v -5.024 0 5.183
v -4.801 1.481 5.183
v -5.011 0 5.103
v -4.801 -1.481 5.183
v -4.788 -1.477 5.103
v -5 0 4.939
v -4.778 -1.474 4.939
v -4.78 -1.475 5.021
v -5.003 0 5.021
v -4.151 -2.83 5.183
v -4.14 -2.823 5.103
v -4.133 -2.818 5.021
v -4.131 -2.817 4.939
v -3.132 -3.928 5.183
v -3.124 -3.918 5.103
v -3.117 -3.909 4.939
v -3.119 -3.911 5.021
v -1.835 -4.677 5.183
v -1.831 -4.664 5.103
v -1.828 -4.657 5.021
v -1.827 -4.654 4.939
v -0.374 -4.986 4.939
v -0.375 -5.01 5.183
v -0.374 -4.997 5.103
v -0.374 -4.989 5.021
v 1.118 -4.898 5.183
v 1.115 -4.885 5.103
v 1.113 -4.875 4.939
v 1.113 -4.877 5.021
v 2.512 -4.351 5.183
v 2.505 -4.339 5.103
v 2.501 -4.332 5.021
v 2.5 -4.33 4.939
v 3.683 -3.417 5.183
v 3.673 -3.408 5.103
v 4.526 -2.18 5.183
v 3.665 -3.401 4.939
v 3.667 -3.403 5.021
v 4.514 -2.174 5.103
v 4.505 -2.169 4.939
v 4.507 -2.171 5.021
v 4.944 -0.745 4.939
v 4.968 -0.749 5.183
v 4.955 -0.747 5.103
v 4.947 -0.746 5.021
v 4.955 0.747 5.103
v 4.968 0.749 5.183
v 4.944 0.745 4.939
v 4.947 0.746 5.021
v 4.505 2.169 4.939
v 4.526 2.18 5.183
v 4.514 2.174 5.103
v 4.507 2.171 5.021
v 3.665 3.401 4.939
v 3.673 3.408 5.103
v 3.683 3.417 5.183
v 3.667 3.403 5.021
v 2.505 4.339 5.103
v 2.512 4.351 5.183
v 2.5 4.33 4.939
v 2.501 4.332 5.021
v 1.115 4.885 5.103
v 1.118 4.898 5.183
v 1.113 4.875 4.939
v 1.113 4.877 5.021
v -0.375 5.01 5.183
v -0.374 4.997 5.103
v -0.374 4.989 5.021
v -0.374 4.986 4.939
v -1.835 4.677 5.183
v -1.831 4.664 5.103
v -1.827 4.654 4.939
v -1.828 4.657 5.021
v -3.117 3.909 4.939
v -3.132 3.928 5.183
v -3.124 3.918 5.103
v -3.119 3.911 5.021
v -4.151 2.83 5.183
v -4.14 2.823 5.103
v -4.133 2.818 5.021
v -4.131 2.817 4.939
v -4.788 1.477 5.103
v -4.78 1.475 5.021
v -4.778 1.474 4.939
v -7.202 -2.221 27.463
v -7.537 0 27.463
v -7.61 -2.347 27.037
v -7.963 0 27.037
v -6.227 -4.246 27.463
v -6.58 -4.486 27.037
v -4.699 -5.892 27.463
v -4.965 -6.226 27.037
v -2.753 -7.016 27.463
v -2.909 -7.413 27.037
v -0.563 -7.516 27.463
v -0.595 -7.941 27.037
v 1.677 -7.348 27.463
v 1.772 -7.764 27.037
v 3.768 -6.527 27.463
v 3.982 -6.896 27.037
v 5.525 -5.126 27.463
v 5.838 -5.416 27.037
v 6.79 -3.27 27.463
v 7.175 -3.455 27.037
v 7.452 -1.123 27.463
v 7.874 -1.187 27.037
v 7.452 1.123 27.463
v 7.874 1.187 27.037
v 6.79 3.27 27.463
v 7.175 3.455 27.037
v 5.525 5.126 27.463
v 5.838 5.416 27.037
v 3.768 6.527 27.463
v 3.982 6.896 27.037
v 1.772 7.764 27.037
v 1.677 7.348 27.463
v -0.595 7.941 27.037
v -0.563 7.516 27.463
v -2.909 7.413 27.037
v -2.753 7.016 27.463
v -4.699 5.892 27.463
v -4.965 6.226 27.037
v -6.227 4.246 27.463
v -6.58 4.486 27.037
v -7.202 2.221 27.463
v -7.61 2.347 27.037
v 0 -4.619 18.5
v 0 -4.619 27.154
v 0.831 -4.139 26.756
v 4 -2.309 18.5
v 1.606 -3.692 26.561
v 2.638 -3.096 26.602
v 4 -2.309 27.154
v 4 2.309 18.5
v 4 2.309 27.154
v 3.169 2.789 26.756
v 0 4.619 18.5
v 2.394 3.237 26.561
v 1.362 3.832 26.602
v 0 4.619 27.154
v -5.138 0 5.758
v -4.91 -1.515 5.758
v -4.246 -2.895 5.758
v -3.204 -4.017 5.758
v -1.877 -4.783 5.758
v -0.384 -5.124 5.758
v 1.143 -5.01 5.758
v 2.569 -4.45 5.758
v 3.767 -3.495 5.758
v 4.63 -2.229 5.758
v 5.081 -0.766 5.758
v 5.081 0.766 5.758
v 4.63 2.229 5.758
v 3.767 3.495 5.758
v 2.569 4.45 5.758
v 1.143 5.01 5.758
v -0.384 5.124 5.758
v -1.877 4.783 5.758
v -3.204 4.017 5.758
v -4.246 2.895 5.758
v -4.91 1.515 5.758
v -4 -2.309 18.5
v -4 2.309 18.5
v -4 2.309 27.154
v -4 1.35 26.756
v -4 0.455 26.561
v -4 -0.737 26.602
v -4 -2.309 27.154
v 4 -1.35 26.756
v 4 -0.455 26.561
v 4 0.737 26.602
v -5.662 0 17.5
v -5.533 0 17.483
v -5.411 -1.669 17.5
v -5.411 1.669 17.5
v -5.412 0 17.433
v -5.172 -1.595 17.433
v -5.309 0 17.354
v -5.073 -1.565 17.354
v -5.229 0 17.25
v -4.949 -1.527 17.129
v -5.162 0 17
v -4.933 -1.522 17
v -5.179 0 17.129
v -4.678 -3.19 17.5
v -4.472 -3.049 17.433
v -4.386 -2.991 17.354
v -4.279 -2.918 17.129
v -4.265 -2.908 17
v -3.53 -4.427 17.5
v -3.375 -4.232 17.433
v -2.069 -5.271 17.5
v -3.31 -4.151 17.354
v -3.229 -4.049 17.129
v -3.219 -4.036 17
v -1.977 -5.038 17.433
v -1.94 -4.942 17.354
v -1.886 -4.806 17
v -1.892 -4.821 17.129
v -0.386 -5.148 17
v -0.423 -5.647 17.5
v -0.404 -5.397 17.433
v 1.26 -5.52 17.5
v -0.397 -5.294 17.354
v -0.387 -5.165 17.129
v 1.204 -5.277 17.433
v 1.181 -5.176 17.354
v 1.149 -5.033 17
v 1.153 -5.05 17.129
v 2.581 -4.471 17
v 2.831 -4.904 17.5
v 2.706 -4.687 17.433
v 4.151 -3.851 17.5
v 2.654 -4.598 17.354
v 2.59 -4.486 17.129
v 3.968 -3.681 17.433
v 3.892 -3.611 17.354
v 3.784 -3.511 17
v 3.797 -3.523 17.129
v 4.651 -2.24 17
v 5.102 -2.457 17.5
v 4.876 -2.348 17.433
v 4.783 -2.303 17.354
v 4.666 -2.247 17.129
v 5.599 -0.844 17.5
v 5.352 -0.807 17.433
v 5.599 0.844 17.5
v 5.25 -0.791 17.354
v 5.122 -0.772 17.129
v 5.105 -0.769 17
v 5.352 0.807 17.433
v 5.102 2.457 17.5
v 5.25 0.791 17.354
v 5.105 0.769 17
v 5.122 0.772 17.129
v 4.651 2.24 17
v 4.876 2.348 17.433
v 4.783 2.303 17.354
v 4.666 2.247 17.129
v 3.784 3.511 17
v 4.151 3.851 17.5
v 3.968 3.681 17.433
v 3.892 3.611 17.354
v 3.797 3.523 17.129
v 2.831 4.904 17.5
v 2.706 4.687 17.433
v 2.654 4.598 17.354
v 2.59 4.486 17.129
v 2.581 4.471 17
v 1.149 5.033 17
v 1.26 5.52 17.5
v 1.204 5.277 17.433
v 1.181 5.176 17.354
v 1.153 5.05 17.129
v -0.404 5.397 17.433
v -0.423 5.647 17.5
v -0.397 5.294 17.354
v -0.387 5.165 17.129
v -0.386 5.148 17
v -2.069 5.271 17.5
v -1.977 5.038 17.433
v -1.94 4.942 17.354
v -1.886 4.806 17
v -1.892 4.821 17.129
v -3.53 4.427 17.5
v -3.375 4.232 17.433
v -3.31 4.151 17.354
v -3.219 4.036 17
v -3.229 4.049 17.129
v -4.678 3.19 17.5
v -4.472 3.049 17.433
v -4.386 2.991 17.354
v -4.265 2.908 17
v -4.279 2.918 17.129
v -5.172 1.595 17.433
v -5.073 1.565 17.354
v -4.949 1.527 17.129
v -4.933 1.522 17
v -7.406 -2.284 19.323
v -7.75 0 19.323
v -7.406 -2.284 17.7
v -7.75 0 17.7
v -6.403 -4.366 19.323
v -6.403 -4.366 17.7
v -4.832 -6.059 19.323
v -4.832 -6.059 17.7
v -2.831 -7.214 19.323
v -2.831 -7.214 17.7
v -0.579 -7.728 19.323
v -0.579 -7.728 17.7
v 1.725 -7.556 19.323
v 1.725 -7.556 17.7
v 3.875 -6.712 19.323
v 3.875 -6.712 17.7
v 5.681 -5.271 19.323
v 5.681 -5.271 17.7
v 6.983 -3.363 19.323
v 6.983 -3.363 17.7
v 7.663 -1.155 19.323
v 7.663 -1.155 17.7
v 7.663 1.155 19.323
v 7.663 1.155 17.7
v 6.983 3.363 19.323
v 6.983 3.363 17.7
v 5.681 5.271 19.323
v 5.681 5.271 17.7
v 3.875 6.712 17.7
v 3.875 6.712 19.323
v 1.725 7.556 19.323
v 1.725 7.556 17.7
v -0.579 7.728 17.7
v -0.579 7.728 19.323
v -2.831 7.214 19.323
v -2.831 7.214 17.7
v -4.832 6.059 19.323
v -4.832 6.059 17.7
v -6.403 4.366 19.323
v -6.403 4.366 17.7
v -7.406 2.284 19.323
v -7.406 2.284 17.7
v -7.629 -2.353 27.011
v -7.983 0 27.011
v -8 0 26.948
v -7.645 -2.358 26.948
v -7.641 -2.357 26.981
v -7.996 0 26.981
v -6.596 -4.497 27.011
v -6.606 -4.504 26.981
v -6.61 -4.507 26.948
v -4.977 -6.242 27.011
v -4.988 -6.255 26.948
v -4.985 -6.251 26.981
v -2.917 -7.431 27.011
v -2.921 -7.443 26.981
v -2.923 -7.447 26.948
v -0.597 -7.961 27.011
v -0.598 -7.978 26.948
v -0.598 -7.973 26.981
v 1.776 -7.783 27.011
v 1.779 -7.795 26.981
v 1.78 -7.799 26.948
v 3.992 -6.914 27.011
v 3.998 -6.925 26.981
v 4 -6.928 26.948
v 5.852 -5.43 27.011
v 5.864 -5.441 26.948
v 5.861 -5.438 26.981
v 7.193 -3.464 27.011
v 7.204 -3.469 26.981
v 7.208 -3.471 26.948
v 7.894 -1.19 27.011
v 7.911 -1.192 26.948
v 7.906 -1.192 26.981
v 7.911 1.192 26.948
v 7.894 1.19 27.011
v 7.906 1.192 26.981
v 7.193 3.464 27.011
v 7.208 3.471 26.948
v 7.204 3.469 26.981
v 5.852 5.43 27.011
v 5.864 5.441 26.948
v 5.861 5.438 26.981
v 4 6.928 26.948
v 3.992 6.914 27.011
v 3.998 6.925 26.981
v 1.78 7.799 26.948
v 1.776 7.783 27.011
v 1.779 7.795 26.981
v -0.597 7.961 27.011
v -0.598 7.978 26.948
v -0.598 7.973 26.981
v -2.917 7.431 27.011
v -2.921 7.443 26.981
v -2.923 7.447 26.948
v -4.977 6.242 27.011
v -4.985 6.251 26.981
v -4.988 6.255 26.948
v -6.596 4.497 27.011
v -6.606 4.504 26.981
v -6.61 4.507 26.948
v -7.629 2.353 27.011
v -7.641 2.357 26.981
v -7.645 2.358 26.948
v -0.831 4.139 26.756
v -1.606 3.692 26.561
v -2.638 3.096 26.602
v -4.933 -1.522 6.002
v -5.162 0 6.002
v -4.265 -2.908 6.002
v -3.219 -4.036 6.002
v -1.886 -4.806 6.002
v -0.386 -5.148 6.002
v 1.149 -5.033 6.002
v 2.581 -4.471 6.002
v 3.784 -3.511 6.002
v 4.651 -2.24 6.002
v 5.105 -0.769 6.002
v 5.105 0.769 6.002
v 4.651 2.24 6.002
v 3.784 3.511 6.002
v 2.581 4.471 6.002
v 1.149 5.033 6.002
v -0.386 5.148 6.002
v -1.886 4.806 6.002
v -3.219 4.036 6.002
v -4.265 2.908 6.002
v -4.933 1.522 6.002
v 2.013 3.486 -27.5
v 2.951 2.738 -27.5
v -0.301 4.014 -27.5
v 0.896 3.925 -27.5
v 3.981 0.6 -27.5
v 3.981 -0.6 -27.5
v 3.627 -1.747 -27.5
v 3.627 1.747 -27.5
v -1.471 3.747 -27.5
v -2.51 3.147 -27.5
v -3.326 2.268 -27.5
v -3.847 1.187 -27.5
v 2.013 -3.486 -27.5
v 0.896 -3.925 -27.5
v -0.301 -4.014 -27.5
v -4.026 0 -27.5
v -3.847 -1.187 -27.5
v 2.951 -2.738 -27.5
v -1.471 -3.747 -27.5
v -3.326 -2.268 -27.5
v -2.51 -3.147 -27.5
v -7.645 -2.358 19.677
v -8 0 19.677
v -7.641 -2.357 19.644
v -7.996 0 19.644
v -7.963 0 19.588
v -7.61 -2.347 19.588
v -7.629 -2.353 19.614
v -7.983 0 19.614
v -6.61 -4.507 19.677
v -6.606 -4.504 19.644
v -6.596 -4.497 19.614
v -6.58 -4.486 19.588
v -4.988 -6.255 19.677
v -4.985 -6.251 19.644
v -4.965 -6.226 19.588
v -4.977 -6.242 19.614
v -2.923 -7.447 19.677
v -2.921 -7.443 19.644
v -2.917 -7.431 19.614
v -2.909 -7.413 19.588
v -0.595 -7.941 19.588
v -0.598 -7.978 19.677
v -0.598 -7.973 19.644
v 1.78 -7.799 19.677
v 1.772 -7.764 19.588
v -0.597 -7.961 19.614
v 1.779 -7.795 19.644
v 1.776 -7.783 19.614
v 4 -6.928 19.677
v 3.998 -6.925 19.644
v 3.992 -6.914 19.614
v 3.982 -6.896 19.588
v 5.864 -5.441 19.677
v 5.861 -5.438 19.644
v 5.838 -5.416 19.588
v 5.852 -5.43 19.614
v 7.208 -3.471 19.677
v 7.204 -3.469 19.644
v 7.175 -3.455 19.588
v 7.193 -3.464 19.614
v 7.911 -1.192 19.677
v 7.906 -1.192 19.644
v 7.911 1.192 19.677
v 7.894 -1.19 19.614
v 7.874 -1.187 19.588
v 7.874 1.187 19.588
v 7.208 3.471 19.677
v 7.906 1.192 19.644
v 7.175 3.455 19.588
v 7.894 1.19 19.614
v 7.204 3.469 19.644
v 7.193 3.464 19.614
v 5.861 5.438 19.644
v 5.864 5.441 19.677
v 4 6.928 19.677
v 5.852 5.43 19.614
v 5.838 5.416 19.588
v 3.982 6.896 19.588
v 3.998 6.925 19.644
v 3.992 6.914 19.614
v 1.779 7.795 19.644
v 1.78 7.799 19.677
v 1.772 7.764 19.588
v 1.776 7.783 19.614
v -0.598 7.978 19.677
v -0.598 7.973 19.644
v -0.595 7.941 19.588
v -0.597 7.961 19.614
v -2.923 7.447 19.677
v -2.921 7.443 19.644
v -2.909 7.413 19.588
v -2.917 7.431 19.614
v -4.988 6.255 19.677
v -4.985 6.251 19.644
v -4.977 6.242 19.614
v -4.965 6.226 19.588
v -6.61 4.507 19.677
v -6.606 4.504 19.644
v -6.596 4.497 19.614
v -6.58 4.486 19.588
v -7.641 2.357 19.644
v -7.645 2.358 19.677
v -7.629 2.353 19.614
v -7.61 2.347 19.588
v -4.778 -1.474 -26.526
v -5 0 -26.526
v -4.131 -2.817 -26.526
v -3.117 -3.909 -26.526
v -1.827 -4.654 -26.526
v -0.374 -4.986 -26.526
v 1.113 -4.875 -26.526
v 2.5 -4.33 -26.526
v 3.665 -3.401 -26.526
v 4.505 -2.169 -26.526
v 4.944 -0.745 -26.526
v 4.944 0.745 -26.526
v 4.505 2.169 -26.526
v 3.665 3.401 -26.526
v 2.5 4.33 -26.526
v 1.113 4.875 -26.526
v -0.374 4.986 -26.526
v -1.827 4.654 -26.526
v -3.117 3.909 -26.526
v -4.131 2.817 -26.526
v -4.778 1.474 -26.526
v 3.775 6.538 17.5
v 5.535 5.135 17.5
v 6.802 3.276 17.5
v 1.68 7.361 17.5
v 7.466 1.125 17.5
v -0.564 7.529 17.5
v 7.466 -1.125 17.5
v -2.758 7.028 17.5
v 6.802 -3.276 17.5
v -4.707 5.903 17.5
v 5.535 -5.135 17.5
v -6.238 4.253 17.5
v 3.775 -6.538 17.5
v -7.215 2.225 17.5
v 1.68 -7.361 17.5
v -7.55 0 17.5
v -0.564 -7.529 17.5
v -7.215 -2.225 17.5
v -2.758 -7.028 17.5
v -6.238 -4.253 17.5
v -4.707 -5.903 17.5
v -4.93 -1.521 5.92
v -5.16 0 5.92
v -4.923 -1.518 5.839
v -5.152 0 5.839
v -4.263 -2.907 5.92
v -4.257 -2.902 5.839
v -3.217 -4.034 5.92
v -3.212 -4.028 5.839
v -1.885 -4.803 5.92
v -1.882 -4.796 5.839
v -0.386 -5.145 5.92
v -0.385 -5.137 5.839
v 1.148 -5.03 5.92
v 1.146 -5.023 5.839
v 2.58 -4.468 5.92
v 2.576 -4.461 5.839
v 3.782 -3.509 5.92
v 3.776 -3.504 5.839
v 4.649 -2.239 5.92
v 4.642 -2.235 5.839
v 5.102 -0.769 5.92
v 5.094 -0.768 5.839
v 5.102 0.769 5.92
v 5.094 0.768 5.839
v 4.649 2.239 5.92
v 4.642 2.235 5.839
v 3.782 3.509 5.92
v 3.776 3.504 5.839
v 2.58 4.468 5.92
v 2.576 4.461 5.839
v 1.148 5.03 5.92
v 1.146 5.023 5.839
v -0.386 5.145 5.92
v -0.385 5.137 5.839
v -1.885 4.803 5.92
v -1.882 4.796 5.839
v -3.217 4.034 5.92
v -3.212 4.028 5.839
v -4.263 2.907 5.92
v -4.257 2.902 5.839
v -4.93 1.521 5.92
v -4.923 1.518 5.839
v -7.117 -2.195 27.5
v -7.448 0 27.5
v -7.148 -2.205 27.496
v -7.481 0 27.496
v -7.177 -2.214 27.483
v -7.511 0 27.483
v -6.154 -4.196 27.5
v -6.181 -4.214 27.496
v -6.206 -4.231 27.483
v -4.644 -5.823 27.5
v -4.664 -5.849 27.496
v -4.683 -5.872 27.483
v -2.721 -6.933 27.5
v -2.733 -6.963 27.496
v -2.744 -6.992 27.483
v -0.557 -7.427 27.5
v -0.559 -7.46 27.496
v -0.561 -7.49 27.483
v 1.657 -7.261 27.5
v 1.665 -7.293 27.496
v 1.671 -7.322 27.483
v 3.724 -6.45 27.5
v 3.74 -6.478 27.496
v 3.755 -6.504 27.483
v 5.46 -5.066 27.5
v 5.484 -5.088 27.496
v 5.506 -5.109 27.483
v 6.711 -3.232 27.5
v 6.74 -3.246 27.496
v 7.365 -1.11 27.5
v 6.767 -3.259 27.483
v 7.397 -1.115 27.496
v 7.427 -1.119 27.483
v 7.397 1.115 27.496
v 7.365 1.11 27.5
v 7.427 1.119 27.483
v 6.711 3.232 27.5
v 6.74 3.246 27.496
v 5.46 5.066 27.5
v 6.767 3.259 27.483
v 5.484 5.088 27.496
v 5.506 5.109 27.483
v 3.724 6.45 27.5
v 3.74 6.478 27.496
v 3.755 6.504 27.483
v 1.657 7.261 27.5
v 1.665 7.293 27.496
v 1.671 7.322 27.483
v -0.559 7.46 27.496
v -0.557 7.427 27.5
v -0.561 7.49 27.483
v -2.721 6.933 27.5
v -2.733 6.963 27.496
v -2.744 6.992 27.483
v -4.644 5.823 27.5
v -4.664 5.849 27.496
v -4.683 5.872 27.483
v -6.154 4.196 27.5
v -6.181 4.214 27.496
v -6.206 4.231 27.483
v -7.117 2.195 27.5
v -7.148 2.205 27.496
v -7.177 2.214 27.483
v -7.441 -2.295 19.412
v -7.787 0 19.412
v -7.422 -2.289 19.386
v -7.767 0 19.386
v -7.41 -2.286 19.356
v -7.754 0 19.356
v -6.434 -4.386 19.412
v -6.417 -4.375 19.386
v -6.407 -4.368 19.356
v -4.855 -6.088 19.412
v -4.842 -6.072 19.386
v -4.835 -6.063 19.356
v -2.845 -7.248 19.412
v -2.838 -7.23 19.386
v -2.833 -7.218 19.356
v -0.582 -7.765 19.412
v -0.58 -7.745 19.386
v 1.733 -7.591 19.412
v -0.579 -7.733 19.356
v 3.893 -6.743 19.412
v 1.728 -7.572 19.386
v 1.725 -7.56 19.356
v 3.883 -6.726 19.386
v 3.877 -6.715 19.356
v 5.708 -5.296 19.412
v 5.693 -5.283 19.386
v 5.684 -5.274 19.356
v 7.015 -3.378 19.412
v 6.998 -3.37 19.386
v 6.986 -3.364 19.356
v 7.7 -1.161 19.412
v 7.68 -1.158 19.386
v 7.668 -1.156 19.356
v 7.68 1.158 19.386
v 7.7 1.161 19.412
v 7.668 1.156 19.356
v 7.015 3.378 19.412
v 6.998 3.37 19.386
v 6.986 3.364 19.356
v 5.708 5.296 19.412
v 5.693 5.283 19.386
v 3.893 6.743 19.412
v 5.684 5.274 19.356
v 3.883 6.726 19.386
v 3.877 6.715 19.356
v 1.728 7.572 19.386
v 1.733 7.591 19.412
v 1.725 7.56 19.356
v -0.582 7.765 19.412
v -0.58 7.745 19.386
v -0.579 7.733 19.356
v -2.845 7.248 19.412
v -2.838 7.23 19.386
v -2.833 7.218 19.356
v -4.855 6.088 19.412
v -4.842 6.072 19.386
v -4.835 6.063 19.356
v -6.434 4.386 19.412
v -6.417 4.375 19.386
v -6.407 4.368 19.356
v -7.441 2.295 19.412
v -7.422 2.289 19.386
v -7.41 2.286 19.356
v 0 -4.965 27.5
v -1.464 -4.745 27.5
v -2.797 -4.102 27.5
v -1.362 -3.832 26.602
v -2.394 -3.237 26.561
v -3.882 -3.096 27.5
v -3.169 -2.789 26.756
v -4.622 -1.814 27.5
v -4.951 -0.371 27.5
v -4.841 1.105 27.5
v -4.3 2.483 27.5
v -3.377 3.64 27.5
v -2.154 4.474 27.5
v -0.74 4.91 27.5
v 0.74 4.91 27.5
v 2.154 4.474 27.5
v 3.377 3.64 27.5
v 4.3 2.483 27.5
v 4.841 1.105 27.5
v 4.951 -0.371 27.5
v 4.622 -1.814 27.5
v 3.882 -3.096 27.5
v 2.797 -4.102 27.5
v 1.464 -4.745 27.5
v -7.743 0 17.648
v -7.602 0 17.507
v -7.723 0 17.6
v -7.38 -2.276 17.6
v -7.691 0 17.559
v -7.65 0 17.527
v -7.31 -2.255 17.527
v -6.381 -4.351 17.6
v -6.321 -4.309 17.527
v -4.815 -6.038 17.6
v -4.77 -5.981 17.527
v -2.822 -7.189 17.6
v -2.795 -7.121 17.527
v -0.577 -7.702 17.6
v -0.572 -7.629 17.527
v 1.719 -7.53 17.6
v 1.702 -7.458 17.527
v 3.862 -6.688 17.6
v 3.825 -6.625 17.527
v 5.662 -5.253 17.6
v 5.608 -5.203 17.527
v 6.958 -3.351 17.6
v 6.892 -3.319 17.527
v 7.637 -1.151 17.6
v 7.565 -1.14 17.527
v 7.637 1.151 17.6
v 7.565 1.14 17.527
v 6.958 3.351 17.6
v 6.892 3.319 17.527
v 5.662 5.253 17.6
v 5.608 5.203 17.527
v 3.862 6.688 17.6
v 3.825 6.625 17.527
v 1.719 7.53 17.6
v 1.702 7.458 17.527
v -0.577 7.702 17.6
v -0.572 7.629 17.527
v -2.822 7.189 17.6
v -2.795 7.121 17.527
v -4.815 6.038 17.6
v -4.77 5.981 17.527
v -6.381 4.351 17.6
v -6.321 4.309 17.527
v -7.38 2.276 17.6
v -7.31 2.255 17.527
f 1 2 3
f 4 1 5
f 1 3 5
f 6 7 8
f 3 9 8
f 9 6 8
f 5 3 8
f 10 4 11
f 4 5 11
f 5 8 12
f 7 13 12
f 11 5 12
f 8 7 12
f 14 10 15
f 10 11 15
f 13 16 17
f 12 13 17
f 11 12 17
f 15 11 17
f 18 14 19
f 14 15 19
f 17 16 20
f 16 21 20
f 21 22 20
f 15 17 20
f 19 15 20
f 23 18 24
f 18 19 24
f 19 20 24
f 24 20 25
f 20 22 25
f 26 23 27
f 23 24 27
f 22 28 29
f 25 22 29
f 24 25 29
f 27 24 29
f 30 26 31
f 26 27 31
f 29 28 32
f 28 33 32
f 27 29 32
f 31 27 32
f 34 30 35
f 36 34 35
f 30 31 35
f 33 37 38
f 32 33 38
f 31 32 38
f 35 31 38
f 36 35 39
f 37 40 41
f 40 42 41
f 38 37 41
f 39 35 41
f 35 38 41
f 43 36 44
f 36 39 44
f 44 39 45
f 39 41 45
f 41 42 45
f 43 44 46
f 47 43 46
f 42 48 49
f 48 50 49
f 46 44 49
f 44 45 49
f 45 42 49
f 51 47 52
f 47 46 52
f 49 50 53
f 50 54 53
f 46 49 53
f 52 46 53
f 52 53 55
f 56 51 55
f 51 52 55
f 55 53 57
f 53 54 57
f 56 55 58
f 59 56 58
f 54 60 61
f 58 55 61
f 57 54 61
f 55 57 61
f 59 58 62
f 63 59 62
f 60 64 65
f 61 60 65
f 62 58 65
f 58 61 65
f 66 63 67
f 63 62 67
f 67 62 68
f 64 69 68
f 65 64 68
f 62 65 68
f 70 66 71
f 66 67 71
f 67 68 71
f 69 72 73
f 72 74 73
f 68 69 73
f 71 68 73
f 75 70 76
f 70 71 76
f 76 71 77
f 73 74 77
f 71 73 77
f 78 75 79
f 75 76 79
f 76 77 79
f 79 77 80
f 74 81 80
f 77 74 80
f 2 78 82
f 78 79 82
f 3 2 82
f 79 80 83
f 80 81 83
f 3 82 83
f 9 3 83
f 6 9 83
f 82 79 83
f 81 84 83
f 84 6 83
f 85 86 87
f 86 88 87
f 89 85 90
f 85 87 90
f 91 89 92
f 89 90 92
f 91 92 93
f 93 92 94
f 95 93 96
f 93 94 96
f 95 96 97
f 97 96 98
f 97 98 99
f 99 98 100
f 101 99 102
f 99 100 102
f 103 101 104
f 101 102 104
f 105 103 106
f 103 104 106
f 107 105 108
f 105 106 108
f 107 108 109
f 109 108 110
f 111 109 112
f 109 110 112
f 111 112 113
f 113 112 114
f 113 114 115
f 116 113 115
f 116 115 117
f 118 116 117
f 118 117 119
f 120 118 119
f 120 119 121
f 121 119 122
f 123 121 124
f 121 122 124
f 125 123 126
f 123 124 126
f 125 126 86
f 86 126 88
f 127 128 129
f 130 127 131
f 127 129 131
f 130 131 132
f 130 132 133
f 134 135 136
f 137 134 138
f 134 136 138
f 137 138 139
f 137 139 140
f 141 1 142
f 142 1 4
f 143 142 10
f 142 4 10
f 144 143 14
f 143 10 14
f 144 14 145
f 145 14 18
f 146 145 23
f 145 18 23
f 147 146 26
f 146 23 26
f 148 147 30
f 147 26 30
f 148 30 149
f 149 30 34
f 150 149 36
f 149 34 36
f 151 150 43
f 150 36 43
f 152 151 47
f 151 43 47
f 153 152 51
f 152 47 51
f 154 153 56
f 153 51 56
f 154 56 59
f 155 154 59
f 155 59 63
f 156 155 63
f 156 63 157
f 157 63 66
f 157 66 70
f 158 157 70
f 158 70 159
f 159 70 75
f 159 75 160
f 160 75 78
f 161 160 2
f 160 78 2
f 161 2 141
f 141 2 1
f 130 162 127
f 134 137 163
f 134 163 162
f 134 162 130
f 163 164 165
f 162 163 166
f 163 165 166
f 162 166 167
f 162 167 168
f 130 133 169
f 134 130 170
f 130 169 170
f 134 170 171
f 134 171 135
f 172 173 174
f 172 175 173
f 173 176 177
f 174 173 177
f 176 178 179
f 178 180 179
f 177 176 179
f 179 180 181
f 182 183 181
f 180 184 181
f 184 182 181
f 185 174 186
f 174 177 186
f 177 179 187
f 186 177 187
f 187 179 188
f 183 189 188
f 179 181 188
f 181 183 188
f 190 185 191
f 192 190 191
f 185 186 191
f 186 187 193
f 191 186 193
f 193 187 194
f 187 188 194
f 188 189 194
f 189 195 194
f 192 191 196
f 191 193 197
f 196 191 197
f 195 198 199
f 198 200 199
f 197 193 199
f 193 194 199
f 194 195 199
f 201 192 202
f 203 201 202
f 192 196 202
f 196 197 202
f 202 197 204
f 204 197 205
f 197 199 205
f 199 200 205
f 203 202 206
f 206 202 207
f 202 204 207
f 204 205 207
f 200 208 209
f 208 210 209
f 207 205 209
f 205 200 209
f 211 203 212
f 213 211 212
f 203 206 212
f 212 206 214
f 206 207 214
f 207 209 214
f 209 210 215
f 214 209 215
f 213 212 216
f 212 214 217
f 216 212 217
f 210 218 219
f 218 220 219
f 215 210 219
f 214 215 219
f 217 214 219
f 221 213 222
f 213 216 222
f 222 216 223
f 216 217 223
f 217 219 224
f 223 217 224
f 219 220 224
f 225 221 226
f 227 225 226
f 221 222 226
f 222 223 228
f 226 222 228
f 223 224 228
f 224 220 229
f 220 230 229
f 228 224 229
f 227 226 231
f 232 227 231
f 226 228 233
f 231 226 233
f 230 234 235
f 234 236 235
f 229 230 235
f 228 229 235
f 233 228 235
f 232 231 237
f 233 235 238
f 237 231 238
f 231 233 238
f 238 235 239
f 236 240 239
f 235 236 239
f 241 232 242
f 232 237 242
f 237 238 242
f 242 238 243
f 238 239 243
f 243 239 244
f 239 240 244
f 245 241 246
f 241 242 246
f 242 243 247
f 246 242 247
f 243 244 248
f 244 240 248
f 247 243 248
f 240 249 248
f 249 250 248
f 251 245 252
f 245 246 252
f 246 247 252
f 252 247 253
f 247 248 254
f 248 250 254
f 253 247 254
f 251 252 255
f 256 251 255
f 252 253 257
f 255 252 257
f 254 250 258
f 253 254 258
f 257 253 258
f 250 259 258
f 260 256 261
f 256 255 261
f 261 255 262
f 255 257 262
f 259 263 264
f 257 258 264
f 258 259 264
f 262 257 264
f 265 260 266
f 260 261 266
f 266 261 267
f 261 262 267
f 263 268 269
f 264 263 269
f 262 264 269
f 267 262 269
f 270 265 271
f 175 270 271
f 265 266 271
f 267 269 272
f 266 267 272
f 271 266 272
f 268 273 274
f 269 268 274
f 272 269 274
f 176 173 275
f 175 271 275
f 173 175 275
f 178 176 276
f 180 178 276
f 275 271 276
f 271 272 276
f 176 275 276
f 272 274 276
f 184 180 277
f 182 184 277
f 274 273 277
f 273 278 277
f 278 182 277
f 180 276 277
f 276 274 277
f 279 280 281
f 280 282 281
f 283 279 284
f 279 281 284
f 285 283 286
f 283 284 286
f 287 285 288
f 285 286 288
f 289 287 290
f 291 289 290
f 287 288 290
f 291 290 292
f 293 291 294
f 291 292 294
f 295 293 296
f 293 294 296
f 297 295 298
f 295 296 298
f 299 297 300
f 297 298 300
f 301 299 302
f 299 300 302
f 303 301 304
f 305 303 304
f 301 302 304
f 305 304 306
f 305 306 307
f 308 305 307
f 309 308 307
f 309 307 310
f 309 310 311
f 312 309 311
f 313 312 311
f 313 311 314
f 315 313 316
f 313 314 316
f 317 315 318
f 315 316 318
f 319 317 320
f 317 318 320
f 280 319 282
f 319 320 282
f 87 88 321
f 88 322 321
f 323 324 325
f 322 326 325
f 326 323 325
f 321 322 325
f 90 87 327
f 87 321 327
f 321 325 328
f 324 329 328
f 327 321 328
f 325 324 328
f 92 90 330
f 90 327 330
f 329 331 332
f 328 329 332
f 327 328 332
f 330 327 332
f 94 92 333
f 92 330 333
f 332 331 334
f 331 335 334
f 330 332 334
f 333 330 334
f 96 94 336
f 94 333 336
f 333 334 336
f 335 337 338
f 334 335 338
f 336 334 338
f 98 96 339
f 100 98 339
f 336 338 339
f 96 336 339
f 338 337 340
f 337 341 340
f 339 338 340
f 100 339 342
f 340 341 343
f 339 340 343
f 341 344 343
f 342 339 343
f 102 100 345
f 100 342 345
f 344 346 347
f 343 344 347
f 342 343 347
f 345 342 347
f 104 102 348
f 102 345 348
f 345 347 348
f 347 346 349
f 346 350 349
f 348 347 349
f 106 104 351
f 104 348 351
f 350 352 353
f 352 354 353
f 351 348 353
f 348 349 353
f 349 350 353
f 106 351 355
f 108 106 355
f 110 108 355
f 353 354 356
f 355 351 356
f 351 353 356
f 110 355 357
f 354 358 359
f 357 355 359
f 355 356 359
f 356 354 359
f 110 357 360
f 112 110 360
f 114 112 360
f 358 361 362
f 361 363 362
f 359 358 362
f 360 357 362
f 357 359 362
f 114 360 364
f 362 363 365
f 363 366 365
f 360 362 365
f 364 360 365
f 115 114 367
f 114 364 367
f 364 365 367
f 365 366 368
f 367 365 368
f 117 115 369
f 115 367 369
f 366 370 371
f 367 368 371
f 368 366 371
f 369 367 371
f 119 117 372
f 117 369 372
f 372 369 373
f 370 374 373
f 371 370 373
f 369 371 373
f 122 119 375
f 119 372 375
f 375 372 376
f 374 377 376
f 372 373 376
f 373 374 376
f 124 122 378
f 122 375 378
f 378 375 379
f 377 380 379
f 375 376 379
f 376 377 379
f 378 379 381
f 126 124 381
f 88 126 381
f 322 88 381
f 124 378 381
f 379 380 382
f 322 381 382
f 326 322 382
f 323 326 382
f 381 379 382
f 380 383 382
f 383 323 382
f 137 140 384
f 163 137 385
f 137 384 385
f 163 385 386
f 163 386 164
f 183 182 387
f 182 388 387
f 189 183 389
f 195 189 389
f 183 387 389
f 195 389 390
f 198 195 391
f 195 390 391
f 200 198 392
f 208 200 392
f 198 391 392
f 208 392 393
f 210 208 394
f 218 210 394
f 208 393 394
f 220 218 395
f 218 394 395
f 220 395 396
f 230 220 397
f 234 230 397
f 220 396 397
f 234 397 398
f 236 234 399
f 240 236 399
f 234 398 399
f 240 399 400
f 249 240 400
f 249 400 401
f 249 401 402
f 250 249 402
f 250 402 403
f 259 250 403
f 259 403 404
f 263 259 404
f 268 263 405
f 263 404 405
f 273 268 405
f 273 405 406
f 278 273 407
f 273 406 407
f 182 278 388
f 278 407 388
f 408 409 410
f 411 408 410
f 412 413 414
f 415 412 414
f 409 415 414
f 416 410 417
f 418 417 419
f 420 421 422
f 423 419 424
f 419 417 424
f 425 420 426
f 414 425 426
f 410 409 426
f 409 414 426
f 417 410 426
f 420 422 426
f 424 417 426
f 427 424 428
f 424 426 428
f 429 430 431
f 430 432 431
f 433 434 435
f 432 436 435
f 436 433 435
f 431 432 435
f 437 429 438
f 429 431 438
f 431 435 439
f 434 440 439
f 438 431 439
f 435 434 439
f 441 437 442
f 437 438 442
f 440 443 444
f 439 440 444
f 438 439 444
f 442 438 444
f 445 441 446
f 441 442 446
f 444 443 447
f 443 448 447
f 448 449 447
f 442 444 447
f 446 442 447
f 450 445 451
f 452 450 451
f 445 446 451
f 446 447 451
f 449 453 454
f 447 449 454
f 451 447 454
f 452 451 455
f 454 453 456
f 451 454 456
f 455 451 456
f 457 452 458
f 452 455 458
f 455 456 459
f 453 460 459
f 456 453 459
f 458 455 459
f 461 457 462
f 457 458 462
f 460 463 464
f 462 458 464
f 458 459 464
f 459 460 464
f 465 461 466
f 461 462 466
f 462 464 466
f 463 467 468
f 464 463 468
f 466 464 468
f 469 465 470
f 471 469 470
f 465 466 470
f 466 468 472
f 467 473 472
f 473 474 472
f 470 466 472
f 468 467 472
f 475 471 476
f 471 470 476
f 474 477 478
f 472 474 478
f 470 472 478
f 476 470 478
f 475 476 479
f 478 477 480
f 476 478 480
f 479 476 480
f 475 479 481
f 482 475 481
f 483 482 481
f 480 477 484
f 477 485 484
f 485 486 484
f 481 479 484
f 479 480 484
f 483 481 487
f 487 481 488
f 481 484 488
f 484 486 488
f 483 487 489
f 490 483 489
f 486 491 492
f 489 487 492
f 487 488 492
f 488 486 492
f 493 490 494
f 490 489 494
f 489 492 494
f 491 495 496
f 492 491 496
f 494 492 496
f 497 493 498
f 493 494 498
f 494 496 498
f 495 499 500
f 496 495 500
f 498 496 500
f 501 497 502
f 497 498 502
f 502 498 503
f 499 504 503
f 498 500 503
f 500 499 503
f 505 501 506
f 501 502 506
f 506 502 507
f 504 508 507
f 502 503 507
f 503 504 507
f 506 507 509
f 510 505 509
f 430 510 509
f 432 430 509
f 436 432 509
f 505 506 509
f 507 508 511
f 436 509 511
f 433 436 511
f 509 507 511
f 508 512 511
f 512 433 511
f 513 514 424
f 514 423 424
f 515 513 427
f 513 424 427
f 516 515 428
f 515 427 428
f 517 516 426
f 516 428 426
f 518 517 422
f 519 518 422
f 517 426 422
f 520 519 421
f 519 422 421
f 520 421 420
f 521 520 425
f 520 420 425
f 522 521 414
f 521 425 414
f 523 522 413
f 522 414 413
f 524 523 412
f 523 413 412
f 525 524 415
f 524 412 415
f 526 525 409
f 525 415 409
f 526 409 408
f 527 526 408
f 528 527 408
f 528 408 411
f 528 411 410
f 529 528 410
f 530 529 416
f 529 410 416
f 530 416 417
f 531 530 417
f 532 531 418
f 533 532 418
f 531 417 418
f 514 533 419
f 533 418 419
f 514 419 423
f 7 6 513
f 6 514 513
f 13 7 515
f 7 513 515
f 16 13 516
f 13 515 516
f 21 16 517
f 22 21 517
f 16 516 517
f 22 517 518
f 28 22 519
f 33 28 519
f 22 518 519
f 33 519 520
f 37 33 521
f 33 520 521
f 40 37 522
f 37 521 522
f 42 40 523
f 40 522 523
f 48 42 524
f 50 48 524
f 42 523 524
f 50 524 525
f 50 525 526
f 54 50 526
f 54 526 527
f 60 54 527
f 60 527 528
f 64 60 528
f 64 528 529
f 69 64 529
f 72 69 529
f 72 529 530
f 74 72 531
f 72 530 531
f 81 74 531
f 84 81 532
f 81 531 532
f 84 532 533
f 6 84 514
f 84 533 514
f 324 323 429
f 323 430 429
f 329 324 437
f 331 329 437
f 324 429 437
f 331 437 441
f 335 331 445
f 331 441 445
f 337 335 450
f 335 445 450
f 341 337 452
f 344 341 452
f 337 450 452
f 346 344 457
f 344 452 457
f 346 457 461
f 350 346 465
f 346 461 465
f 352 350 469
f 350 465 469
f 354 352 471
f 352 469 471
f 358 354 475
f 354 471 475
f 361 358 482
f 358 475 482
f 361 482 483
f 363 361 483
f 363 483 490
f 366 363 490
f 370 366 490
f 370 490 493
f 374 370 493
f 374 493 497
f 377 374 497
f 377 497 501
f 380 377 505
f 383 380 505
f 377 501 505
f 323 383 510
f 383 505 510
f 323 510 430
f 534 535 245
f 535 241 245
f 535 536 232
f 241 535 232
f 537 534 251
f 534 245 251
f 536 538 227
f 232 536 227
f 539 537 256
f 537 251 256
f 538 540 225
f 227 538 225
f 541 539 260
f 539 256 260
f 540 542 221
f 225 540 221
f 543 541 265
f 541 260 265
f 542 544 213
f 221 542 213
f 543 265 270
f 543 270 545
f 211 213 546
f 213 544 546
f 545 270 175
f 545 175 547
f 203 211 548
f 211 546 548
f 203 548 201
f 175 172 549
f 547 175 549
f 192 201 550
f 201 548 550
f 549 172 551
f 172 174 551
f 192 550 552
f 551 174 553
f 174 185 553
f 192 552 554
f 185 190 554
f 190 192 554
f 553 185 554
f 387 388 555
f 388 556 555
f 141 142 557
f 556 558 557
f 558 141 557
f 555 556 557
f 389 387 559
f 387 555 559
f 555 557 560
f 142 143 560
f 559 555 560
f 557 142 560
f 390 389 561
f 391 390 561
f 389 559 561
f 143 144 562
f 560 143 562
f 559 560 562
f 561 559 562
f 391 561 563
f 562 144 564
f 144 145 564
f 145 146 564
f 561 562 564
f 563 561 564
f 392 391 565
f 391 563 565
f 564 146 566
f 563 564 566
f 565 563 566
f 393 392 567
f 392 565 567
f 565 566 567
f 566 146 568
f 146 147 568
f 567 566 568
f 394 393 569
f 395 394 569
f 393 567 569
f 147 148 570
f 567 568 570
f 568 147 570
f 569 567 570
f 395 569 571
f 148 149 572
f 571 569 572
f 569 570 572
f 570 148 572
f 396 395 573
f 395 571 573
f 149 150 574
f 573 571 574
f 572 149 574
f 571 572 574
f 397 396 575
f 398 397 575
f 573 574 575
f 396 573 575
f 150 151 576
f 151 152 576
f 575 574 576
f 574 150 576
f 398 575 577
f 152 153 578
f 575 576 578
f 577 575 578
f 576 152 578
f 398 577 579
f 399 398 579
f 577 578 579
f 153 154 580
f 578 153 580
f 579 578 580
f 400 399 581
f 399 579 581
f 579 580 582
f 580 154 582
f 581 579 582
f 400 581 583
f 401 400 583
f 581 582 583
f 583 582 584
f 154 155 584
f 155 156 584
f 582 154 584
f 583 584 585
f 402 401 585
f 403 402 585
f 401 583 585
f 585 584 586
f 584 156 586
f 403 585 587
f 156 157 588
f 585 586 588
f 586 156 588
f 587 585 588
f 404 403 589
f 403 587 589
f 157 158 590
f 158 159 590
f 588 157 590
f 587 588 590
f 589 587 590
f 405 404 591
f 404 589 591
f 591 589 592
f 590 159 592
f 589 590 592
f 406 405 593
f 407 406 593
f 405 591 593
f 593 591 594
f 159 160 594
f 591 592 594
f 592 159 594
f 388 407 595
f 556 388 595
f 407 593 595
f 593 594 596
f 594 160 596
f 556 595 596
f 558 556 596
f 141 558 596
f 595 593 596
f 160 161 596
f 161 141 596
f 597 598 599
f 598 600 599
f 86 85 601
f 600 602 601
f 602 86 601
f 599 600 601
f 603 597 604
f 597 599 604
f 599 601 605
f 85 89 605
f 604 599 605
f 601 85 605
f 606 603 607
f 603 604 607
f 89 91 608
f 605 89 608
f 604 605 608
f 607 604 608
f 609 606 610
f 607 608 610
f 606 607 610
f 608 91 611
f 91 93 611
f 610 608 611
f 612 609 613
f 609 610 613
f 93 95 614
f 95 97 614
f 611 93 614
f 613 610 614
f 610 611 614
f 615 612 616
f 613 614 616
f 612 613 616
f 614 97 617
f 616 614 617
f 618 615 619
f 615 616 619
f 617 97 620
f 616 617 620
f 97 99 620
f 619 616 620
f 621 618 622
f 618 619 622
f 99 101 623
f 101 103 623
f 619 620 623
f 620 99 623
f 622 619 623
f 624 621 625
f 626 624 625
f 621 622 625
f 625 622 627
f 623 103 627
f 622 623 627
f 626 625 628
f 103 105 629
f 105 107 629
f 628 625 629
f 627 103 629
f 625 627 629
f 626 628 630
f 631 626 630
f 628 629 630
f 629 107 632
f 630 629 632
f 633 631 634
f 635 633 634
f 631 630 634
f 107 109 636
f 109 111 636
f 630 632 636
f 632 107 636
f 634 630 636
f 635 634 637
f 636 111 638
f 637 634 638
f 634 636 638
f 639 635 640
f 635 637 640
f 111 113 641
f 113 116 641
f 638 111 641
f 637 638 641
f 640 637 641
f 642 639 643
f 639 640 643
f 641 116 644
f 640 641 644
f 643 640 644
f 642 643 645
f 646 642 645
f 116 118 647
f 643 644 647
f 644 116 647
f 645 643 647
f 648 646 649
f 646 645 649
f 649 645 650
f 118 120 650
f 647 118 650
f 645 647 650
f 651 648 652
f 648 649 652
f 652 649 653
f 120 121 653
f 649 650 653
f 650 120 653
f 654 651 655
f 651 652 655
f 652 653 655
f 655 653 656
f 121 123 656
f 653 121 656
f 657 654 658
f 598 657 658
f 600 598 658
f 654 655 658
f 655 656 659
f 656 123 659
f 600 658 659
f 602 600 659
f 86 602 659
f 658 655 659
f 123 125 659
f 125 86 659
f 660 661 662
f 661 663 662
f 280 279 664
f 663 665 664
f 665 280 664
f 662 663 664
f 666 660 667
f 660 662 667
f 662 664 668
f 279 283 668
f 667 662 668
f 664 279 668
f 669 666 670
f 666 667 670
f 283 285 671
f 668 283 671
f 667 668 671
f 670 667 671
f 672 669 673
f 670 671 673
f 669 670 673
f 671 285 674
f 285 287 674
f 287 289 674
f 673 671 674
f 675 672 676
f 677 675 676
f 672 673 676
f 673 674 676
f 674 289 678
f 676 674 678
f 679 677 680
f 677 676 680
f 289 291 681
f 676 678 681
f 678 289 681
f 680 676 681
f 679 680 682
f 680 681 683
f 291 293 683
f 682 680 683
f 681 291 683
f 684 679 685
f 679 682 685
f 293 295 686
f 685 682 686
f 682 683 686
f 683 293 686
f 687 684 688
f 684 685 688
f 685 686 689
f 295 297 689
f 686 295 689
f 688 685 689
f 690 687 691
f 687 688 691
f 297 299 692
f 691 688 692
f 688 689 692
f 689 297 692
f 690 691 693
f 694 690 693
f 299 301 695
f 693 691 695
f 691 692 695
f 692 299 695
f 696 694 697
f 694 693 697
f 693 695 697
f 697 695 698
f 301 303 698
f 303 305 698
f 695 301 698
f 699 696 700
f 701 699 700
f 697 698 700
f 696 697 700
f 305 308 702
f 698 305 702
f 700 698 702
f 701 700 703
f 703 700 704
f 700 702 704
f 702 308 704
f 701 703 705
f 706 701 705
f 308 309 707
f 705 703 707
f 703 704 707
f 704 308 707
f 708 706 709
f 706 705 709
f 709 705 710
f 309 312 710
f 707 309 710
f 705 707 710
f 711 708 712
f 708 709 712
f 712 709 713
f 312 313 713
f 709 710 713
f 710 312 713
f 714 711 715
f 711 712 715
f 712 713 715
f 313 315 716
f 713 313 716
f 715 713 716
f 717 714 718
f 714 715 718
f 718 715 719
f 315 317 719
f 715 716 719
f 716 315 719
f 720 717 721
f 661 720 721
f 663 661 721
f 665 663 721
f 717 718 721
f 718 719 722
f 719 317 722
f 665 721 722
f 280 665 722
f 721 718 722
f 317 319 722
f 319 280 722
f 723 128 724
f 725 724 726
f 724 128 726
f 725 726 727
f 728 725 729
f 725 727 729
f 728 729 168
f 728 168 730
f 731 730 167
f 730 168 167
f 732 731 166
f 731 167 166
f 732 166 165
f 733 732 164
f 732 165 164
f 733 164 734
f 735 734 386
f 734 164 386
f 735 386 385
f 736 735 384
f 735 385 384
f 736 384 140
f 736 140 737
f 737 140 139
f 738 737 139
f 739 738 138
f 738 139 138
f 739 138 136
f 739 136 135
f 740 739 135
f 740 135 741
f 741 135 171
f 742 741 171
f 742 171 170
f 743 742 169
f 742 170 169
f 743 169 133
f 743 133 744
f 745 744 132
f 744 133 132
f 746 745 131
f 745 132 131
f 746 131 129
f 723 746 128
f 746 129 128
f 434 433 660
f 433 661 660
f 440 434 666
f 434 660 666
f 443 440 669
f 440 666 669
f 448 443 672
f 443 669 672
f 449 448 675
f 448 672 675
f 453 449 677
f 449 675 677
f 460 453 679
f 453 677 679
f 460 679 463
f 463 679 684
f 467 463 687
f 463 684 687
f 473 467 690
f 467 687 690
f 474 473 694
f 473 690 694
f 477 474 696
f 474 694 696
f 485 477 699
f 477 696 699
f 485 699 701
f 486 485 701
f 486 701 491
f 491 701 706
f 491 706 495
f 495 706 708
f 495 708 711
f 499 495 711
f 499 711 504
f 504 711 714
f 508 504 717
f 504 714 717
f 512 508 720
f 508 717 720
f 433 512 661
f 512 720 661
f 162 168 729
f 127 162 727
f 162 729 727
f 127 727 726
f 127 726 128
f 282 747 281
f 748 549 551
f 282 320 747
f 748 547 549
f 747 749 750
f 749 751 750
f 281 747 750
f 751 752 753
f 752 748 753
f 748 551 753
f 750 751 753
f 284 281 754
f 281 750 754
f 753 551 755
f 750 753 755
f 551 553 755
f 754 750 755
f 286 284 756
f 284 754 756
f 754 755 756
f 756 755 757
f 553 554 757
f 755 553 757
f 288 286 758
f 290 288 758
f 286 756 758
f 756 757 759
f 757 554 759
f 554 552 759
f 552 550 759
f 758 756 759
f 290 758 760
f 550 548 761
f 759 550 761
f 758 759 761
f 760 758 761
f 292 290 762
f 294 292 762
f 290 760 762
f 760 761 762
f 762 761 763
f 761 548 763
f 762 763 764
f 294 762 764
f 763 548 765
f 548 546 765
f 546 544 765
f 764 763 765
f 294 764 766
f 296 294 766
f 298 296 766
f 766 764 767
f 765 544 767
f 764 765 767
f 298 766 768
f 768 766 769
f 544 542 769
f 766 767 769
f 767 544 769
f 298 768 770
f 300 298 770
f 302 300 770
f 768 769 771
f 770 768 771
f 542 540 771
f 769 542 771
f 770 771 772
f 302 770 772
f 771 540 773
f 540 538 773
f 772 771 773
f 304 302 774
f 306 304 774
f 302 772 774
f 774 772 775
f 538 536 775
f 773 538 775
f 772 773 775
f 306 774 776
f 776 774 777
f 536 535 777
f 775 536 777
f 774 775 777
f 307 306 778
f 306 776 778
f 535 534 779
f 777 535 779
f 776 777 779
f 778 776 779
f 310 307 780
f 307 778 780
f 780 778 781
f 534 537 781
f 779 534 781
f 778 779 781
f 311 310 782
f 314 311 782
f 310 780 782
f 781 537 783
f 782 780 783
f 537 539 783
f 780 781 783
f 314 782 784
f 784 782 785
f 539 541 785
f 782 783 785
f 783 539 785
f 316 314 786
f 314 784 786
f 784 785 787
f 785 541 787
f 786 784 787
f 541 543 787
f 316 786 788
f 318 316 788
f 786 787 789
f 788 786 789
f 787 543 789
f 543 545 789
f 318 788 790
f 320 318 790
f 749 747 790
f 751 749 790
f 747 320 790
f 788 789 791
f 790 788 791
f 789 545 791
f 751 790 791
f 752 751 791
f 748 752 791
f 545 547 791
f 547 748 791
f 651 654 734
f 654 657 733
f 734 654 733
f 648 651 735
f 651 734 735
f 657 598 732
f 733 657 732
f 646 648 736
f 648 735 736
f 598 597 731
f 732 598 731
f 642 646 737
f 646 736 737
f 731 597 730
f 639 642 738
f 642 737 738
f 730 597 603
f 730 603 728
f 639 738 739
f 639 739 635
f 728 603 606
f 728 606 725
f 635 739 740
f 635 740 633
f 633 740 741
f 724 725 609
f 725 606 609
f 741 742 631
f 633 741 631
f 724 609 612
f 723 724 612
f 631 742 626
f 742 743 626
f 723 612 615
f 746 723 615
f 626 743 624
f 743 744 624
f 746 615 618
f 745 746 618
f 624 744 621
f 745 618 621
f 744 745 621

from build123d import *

# Parameters (mm, degrees)
CUT_EXTRUDE1_DEPTH = 9


with BuildPart() as part:
    # Sketch2 → Revolve1 (revolve)
    with BuildSketch(Plane(origin=(0, 0, 0), x_dir=(0, 0, -1), z_dir=(1, 0, 0)), mode=Mode.PRIVATE) as revolve1_sk:
        with BuildLine():
            Line((-27.5, 0), (-27.5, 7.448223305))
            ThreePointArc((-27.5, 7.448223305), (-27.490484942, 7.496058734), (-27.463388348, 7.536611652))
            Line((-27.463388348, 7.536611652), (-27.036611652, 7.963388348))
            ThreePointArc((-27.036611652, 7.963388348), (-26.996058734, 7.990484942), (-26.948223305, 8))
            Line((-26.948223305, 8), (-19.676776695, 8))
            ThreePointArc((-19.676776695, 8), (-19.628941266, 7.990484942), (-19.588388348, 7.963388348))
            Line((-19.588388348, 7.963388348), (-19.411611652, 7.786611652))
            ThreePointArc((-19.411611652, 7.786611652), (-19.371058734, 7.759515058), (-19.323223305, 7.75))
            Line((-19.323223305, 7.75), (-17.7, 7.75))
            ThreePointArc((-17.7, 7.75), (-17.558578644, 7.691421356), (-17.5, 7.55))
            Line((-17.5, 7.55), (-17.5, 5.662379763))
            ThreePointArc((-17.5, 5.662379763), (-17.353553391, 5.308826373), (-17, 5.162379763))
            Line((-17, 5.162379763), (-6.001952451, 5.162379763))
            ThreePointArc((-6.001952451, 5.162379763), (-5.879431025, 5.156360672), (-5.758089548, 5.138361364))
            Line((-5.758089548, 5.138361364), (-5.183248648, 5.024018399))
            ThreePointArc((-5.183248648, 5.024018399), (-5.061907171, 5.006019092), (-4.939385746, 5))
            Line((-4.939385746, 5), (26.525721421, 5))
            Line((26.525721421, 5), (27.5, 4.025721421))
            Line((27.5, 4.025721421), (27.5, 0))
            Line((27.5, 0), (-27.5, 0))
        make_face()
    revolve(revolve1_sk.sketch.rotate(Axis((0, 0, -27.5), (0, 0, 1)), 90), axis=Axis((0, 0, -27.5), (0, 0, 1)))

    # Sketch3 → Cut-Extrude1 (cut)
    with BuildSketch(Plane.XY.offset(27.5)):
        Polygon((4, -2.309401077), (4, 2.309401077), (0, 4.618802154), (-4, 2.309401077), (-4, -2.309401077), (0, -4.618802154), align=None)
    extrude(amount=-CUT_EXTRUDE1_DEPTH, mode=Mode.SUBTRACT)

    # Cut-Extrude2 cone 1 section (through the dimple's axis) → Cut-Extrude2 (revolve, cut)
    with BuildSketch(Plane(origin=(0, 0, 27.5), x_dir=(0, -1, 0), z_dir=(1, 0, 0))):
        Polygon((0, 0), (4.965212315, 0), (0, 4.965212315), align=None)
    revolve(axis=Axis((0, 0, 27.5), (0, 0, -1)), mode=Mode.SUBTRACT)


solid = part.part
